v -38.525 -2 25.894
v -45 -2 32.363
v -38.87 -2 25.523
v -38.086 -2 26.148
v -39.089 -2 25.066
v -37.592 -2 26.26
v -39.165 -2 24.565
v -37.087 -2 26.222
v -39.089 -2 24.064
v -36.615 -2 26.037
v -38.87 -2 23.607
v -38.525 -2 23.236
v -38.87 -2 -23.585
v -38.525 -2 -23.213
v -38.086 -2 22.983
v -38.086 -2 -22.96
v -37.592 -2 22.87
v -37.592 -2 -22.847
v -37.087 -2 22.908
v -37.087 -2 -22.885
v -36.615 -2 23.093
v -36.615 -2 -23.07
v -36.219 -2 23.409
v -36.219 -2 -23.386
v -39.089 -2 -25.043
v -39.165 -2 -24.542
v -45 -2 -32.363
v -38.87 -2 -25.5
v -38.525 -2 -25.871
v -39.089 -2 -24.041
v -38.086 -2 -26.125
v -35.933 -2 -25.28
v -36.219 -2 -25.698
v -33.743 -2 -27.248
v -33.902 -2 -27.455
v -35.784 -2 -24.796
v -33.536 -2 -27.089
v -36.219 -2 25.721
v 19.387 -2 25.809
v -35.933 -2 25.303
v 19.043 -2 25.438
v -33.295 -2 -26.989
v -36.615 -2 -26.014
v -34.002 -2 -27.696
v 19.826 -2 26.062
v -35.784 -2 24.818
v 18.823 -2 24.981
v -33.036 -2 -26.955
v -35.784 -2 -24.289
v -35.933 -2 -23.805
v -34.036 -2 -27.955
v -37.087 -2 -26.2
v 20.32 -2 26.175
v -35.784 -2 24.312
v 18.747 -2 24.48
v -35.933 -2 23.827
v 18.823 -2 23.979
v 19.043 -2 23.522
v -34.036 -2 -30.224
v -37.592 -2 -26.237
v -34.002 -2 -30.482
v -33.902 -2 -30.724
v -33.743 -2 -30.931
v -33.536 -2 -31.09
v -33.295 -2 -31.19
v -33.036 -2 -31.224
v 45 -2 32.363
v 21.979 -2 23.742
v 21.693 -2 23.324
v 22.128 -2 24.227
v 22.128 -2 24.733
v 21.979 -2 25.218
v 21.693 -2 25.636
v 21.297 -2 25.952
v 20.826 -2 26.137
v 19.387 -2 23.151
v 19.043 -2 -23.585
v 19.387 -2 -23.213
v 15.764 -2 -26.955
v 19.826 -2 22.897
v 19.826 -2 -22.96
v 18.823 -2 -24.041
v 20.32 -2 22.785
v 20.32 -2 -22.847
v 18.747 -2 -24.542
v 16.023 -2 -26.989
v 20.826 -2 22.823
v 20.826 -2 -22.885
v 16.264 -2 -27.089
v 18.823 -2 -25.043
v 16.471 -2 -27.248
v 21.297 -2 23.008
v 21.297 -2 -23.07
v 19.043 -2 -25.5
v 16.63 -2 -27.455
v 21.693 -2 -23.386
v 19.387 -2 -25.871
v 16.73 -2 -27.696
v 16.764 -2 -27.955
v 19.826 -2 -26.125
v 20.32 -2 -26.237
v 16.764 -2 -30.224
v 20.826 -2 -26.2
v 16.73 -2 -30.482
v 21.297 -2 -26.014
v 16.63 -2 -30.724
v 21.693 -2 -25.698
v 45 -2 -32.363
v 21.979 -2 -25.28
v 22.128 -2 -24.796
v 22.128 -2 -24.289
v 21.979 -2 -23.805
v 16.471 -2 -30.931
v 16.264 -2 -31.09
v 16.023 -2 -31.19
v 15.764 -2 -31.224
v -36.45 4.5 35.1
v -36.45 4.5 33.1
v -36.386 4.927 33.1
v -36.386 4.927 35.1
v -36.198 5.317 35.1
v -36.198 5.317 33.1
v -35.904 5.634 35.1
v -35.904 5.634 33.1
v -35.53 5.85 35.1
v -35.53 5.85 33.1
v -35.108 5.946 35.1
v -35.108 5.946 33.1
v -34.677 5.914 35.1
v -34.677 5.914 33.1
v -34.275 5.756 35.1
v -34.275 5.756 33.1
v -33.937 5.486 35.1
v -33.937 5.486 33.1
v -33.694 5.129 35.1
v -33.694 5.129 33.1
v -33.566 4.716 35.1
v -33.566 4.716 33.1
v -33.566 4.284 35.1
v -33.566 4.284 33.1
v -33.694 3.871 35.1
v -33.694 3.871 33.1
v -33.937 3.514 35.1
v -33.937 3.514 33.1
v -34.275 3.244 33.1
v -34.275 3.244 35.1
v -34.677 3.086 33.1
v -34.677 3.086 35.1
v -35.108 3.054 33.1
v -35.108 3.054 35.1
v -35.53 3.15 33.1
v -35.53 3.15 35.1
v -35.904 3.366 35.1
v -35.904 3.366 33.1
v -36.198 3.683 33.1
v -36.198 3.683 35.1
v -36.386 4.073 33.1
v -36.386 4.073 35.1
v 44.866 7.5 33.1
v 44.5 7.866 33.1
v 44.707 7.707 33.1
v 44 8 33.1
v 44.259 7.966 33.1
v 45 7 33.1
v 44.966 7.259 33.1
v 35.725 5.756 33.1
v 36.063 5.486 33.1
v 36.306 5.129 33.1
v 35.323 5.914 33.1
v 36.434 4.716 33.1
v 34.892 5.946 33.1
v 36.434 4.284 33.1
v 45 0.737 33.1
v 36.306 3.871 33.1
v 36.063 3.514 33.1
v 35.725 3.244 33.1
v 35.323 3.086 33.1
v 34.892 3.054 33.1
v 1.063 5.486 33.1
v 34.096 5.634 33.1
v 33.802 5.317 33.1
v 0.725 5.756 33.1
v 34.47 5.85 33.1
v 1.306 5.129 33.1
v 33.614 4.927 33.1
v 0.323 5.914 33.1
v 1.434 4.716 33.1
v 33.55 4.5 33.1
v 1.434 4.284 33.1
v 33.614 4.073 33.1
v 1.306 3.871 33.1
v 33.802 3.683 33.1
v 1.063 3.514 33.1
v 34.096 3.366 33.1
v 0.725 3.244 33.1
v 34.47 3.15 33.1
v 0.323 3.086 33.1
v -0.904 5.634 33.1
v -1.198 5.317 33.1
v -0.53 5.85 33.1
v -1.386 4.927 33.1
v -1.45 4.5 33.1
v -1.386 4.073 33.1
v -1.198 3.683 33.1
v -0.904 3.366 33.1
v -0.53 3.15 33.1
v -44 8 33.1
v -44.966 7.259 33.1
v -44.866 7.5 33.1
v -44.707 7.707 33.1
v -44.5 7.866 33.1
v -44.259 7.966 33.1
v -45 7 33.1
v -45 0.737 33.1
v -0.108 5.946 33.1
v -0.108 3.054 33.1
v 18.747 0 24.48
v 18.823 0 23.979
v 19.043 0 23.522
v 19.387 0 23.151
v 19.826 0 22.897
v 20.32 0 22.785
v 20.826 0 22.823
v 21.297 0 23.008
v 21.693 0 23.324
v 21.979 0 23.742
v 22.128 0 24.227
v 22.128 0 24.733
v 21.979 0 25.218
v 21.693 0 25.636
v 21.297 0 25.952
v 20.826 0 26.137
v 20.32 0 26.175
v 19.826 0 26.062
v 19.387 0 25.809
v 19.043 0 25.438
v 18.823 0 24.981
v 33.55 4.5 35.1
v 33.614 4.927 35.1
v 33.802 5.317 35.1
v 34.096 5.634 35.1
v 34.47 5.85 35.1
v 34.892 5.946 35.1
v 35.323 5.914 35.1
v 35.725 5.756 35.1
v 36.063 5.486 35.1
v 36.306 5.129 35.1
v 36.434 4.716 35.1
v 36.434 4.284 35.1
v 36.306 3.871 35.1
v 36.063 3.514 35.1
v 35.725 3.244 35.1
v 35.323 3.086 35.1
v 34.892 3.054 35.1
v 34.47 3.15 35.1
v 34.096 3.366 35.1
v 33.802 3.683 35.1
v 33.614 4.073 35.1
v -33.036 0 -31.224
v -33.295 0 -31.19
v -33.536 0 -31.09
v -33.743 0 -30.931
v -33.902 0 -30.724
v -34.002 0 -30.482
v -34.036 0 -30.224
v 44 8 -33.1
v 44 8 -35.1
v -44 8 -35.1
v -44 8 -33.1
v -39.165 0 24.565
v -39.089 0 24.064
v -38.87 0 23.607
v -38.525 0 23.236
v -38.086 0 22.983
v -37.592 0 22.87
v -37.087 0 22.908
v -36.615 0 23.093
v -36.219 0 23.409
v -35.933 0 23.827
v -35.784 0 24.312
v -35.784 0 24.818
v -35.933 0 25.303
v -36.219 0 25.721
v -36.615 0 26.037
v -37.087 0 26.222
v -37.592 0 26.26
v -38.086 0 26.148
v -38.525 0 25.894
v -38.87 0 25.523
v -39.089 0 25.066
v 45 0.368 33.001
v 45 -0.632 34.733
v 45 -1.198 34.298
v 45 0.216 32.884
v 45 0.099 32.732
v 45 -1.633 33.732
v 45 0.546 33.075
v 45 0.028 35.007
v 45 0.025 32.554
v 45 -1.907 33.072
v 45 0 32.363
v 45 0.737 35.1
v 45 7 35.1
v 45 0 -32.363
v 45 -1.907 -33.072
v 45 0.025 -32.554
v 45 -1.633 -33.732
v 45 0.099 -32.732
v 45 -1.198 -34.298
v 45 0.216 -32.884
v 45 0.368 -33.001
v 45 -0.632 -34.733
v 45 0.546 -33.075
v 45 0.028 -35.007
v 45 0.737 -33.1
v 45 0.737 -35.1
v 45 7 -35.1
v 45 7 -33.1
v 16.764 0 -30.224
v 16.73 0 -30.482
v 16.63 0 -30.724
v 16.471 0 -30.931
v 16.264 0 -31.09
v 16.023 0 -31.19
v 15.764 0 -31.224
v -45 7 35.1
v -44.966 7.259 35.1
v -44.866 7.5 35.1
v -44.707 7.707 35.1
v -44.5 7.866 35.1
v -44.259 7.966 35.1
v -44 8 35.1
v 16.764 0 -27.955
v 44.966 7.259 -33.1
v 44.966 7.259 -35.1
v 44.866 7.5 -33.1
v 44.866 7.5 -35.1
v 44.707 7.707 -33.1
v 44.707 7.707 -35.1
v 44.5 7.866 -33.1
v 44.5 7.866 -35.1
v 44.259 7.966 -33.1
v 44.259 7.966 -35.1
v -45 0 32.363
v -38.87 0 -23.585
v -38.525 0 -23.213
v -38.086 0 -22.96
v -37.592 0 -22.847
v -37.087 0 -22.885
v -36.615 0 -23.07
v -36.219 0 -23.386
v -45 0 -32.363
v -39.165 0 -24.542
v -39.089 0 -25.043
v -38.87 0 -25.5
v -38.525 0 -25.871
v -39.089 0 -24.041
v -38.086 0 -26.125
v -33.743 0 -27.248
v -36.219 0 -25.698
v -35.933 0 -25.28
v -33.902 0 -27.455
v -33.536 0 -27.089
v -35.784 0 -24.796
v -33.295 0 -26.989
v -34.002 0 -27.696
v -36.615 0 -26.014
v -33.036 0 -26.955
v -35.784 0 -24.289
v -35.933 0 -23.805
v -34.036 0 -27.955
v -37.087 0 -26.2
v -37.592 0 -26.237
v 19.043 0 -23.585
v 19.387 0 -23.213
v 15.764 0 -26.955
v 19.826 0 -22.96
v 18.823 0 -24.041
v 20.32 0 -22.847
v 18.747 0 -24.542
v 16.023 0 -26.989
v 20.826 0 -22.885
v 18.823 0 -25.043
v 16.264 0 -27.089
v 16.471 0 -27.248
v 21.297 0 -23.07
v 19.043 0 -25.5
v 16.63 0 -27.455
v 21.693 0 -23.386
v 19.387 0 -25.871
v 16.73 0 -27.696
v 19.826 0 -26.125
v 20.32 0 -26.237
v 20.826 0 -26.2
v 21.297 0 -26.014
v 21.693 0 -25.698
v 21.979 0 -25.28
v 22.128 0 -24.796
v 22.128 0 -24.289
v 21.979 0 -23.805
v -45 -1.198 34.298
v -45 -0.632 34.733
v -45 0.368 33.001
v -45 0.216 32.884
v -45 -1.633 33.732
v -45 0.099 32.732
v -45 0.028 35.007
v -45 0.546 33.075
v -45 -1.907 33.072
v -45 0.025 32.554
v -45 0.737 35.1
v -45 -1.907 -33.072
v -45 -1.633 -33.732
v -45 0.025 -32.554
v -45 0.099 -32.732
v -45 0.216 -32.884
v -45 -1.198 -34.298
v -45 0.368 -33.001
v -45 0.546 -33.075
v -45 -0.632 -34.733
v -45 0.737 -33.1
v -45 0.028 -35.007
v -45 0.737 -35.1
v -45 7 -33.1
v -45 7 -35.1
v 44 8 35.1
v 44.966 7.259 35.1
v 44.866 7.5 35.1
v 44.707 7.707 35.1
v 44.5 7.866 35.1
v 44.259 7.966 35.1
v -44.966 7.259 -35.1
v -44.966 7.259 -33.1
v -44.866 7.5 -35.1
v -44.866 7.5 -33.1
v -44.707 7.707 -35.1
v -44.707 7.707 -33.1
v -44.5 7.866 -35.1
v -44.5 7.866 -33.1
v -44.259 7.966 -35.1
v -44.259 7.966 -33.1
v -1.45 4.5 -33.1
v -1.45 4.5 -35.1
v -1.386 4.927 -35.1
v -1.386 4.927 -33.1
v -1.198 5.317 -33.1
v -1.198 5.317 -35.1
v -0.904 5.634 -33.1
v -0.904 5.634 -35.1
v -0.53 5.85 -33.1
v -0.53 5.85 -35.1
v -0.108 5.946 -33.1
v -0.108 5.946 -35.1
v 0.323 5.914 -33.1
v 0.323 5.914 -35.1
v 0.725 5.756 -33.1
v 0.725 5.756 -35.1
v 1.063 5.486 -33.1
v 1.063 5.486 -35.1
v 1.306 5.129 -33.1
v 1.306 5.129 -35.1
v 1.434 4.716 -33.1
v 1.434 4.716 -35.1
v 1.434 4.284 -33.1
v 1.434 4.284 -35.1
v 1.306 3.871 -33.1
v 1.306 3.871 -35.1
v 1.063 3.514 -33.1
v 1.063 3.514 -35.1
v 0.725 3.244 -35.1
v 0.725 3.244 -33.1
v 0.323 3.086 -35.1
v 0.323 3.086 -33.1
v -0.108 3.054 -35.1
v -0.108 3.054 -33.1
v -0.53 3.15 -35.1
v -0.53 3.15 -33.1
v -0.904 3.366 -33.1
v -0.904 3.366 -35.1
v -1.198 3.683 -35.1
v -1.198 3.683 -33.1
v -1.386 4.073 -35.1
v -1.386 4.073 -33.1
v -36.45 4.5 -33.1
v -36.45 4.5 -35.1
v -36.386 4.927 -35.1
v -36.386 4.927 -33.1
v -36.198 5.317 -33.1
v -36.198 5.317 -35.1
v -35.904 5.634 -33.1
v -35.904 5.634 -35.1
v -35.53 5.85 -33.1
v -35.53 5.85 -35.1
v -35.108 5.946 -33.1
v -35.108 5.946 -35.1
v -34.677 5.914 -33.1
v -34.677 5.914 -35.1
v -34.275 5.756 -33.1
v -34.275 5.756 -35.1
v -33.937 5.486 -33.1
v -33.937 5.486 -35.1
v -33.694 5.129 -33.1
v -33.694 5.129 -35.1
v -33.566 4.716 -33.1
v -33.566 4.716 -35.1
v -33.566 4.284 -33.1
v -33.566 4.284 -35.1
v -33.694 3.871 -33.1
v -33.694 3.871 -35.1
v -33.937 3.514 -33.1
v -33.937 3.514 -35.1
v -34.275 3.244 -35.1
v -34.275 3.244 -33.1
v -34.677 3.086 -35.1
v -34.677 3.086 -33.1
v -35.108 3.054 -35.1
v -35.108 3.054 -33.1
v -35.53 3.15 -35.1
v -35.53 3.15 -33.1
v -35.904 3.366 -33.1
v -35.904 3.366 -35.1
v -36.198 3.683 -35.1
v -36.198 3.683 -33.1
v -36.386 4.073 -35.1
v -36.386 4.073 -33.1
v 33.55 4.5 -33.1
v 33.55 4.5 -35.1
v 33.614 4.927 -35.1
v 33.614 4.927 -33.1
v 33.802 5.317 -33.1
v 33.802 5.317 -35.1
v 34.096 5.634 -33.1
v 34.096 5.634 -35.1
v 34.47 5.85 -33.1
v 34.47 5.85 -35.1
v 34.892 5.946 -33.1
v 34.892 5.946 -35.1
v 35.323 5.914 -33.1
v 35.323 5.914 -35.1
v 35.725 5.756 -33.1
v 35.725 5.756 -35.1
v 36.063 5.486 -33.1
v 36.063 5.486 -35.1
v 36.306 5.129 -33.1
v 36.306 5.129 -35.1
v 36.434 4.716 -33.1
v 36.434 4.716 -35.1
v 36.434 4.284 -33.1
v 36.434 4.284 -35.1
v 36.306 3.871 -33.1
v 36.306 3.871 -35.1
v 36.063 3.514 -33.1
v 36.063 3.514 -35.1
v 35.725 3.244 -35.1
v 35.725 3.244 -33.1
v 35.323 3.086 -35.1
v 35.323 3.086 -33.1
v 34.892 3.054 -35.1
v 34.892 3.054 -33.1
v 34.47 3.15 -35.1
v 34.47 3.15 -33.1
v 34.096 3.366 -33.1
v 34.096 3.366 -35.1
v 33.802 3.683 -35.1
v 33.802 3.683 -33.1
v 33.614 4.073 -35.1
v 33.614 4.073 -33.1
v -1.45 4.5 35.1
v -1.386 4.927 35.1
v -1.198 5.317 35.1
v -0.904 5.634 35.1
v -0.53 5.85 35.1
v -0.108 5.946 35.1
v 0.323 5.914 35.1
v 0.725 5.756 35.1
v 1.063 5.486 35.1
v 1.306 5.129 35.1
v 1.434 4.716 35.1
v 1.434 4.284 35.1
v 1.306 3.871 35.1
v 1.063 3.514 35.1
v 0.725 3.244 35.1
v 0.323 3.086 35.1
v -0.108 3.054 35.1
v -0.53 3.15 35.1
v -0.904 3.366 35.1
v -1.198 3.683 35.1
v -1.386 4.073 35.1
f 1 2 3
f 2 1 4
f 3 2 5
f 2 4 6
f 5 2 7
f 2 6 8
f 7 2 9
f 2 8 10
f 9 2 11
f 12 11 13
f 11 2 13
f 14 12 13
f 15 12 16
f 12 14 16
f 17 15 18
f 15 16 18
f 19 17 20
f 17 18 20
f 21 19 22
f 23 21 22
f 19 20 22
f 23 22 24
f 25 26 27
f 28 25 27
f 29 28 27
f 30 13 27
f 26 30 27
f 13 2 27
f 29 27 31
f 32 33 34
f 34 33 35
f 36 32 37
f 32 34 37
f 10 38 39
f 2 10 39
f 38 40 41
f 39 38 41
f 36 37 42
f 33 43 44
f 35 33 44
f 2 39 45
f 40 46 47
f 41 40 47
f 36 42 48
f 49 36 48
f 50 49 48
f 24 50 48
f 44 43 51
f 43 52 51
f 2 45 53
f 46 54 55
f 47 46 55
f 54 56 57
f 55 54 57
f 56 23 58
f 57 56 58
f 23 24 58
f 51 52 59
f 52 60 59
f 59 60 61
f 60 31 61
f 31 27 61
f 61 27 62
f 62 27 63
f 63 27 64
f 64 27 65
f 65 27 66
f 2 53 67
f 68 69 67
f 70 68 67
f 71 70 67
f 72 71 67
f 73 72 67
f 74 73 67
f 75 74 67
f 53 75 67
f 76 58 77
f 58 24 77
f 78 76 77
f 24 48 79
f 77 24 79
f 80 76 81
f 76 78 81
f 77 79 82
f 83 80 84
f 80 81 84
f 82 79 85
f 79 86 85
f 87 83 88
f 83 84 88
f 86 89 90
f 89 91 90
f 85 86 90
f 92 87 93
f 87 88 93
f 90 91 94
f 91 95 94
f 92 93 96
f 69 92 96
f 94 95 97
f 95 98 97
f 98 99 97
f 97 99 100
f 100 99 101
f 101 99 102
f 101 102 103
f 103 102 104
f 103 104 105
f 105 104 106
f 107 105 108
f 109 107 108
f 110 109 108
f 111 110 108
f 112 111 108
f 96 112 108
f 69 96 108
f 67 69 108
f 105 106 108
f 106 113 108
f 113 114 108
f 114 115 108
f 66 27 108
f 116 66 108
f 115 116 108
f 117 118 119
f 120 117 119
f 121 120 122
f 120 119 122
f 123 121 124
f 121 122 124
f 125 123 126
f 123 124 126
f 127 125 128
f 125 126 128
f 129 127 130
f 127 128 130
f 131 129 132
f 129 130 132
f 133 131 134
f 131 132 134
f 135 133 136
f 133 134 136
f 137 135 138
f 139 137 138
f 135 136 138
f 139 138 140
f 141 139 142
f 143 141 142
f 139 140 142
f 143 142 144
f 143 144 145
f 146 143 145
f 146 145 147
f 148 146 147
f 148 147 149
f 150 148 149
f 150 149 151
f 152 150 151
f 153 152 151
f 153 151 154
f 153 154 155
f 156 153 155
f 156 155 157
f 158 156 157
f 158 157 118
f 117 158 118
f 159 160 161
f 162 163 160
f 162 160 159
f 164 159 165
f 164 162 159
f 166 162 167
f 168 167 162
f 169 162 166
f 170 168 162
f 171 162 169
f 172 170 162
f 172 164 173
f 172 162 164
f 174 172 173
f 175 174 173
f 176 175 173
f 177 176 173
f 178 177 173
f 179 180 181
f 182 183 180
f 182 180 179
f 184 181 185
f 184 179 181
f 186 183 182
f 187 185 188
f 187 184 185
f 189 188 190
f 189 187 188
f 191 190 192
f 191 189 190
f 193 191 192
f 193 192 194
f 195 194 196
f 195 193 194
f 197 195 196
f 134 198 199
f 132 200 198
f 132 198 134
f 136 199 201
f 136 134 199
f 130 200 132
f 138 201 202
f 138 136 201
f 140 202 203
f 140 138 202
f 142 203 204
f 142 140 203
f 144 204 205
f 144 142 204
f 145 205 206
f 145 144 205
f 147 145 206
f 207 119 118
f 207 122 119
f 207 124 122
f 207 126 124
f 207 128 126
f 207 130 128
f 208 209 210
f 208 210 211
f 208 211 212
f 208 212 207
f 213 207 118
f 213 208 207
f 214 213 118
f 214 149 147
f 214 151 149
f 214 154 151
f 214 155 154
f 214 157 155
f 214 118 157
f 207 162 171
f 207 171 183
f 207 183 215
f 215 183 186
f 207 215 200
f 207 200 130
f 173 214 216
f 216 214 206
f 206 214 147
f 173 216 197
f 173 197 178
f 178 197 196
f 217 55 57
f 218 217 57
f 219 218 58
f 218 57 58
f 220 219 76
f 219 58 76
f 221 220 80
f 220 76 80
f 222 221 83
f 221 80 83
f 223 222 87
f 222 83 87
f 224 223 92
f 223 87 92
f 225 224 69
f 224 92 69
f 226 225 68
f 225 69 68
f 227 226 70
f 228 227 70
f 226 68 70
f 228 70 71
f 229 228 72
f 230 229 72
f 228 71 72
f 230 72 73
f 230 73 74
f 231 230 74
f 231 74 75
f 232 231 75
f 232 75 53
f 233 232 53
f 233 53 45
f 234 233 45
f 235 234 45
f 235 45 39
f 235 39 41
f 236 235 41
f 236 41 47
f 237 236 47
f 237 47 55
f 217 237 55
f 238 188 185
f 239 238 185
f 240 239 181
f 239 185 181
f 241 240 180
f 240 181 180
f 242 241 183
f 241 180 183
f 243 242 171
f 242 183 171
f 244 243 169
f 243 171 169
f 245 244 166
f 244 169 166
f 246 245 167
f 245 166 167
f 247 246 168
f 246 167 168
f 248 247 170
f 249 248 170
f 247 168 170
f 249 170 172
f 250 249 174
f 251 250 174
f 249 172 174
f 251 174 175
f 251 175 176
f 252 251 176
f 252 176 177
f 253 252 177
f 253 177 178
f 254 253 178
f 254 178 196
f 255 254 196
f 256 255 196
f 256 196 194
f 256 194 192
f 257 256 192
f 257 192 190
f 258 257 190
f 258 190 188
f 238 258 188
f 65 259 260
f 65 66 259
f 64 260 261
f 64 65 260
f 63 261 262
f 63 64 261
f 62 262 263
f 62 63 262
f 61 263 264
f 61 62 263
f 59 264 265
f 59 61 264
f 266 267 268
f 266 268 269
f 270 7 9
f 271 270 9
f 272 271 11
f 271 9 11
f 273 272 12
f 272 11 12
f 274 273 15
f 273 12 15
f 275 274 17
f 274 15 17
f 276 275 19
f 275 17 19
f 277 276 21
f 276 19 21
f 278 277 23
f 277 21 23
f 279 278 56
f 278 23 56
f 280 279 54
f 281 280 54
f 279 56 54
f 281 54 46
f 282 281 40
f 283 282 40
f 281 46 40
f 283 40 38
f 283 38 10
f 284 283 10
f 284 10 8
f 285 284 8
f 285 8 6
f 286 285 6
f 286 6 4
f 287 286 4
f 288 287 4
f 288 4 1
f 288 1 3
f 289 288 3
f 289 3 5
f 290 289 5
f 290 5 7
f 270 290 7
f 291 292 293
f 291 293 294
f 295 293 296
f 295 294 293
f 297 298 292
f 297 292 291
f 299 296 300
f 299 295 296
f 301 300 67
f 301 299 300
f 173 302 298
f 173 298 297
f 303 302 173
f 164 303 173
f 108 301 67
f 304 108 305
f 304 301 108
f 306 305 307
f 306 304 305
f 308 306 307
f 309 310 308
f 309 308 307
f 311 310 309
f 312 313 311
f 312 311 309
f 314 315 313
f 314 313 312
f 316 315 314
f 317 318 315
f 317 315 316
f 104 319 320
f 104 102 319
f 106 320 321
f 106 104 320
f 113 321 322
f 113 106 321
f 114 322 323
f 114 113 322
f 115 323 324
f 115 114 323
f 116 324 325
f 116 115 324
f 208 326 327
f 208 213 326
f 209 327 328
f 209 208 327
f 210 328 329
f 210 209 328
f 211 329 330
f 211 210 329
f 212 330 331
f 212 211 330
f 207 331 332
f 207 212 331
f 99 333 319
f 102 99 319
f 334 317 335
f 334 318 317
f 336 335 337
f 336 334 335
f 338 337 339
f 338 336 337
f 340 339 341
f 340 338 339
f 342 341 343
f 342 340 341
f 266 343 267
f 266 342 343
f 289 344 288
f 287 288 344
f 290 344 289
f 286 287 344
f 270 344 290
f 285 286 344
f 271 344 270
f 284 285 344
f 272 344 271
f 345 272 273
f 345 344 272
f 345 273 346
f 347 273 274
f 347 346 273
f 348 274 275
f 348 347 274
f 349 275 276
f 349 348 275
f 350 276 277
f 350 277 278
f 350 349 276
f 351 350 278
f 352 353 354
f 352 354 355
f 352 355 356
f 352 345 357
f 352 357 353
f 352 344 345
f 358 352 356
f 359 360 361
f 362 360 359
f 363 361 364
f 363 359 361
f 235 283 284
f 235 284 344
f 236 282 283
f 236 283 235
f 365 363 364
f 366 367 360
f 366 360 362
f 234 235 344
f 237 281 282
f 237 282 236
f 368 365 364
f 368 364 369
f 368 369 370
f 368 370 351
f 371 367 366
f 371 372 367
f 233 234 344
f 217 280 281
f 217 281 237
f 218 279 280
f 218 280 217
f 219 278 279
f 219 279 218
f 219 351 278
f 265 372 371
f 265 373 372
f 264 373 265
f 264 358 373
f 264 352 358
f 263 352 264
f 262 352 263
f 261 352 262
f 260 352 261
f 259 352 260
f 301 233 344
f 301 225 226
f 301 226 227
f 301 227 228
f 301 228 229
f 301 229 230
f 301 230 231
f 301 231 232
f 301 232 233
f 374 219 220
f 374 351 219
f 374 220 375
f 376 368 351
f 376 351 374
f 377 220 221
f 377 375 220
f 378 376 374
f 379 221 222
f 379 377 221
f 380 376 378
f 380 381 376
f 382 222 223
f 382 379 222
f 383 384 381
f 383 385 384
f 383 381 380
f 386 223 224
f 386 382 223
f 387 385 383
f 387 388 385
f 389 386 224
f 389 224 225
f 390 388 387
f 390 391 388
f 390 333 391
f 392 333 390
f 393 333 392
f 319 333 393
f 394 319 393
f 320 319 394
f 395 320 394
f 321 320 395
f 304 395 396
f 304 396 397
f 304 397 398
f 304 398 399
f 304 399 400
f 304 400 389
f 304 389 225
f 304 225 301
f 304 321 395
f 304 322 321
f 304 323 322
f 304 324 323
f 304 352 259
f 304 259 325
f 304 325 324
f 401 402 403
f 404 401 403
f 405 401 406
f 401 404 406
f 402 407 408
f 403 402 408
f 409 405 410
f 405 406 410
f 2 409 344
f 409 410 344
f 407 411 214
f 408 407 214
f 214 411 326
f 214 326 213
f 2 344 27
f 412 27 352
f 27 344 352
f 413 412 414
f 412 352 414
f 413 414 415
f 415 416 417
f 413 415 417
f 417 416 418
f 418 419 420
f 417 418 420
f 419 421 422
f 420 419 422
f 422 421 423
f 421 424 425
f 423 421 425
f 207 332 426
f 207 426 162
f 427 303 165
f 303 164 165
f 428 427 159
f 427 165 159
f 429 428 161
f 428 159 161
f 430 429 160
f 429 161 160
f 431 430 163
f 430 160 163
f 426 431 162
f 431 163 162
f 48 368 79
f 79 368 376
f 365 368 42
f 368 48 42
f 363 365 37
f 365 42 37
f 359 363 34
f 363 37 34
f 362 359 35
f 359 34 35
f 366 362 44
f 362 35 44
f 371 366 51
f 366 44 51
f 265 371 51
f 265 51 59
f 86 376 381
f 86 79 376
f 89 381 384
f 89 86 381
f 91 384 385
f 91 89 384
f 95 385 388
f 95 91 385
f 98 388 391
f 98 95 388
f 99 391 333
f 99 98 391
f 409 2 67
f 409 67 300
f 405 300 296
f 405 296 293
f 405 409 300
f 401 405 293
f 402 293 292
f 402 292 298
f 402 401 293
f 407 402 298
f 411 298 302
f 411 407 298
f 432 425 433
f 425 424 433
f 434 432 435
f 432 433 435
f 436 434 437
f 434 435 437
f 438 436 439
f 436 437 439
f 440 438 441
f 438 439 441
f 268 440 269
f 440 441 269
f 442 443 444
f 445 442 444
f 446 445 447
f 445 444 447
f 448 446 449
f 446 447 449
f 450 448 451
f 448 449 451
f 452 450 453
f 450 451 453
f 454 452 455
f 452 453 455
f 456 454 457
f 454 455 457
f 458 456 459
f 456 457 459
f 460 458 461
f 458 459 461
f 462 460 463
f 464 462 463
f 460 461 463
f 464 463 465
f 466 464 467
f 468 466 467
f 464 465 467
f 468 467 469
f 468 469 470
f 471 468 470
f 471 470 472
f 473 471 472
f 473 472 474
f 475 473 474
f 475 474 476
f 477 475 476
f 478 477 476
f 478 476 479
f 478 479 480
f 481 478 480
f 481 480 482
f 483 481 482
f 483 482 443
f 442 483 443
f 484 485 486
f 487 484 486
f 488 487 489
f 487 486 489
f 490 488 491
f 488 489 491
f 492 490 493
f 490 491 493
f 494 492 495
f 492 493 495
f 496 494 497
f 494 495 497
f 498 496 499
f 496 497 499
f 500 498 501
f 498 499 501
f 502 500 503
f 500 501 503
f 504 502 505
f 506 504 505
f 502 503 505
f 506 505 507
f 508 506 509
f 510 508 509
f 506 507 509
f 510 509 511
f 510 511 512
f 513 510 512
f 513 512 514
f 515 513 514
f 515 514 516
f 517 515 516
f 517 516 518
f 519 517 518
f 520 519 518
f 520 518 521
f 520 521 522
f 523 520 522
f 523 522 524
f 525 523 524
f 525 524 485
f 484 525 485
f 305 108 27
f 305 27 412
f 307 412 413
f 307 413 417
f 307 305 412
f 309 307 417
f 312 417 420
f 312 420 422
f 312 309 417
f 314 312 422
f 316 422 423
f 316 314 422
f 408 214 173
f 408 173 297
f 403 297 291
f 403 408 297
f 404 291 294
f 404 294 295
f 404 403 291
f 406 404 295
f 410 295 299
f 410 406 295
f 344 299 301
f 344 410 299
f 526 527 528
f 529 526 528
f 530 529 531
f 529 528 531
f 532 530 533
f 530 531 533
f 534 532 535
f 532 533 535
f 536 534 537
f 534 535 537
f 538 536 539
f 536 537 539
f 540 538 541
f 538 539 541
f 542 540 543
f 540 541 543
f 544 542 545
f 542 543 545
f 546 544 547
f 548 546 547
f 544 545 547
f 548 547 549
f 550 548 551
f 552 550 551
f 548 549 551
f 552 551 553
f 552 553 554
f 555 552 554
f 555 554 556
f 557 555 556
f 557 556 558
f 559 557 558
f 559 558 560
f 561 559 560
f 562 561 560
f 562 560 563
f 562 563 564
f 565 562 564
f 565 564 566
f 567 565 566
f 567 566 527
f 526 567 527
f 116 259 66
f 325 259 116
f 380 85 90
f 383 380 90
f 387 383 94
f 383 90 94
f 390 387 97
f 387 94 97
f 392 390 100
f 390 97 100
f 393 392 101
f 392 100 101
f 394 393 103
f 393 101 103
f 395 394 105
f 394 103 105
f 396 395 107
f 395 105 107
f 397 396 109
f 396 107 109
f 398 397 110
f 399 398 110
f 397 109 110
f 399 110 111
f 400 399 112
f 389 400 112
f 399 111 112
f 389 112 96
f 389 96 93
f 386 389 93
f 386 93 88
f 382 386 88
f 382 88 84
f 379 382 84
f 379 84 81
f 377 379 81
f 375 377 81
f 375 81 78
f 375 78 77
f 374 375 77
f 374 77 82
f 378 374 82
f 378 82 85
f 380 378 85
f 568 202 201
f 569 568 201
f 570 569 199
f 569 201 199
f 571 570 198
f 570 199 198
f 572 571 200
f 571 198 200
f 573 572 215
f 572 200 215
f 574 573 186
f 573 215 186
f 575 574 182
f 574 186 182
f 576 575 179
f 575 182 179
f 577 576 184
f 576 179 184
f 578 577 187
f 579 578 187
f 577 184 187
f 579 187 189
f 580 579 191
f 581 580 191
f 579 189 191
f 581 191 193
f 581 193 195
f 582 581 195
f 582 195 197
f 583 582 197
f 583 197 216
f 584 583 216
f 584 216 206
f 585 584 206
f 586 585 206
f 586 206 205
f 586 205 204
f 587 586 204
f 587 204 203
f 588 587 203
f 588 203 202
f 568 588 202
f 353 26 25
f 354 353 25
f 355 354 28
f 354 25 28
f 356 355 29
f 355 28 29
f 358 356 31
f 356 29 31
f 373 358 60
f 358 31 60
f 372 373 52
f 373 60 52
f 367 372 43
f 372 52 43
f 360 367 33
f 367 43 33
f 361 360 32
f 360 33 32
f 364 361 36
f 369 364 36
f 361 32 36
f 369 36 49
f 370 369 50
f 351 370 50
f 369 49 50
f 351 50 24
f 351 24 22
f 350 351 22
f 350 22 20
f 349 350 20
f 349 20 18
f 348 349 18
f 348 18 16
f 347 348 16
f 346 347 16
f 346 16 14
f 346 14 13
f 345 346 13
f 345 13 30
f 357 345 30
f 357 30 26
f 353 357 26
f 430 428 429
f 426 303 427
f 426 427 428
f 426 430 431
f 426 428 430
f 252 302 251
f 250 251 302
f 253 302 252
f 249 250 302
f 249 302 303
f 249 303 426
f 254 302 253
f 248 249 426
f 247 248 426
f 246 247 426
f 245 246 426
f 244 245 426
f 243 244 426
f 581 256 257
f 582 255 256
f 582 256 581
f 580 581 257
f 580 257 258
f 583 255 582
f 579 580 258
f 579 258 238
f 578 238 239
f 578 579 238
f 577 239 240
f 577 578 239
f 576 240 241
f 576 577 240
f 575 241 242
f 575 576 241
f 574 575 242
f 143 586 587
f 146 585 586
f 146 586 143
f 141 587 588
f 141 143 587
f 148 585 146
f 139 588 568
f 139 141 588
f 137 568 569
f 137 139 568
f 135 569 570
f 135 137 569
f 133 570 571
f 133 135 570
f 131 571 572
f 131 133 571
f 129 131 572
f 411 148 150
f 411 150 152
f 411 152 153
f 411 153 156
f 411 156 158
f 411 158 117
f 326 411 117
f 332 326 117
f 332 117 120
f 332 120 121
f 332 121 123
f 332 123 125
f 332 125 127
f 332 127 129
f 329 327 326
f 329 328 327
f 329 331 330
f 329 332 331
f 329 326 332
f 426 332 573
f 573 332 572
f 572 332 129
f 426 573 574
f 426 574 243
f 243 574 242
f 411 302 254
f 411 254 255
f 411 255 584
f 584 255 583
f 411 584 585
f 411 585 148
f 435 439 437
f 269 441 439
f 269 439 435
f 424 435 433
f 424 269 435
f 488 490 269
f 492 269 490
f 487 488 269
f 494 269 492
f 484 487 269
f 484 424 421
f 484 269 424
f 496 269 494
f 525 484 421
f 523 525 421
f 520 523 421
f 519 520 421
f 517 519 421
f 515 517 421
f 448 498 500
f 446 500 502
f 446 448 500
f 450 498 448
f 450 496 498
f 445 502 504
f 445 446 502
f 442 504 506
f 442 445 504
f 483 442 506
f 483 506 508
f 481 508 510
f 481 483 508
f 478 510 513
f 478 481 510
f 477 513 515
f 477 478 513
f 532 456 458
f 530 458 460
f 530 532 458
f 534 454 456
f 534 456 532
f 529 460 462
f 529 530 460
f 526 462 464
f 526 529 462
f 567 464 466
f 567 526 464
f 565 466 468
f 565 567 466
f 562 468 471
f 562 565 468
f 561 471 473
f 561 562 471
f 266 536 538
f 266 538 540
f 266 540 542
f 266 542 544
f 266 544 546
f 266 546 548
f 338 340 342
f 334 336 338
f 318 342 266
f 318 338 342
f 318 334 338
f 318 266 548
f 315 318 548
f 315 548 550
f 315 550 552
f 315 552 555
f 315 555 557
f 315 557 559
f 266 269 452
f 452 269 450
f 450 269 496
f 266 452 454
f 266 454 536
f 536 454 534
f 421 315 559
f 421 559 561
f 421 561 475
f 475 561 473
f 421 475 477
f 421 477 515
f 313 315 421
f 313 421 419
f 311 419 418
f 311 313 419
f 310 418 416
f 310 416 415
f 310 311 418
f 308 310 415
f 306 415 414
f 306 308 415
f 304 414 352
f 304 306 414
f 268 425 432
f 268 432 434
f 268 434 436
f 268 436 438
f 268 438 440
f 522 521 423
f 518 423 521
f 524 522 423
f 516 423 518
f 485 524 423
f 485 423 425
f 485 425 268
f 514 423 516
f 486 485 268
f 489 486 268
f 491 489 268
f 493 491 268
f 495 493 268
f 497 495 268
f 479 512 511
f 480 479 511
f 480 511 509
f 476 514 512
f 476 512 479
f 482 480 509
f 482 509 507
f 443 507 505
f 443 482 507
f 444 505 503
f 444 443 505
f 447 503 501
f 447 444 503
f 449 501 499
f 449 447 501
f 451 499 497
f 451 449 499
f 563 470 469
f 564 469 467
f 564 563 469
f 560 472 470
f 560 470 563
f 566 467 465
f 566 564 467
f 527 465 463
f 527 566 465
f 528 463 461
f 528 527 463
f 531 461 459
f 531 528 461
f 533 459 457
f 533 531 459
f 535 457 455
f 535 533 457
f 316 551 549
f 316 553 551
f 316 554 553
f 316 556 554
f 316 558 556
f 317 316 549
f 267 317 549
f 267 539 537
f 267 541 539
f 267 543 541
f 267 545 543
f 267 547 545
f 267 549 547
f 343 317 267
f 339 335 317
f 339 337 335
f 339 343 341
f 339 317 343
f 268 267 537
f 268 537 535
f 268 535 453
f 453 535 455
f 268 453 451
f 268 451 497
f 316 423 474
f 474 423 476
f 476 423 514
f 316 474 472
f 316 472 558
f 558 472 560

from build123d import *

# Parameters (mm, degrees)
SKETCH_1_W                         = 90
SKETCH_1_H                         = 70.2
SM_BASE_FLANGE_1_DEPTH             = 2
SM_EDGE_FLANGE_1_STRIP_W           = 9.4732
SM_EDGE_FLANGE_1_STRIP_H           = 2
SM_EDGE_FLANGE_1_STRIP_CUT_DEPTH   = 90
SM_EDGE_FLANGE_1_STRIP_2_W         = 9.4732
SM_EDGE_FLANGE_1_STRIP_2_H         = 2
SM_EDGE_FLANGE_1_STRIP_CUT_2_DEPTH = 90
SM_EDGE_FLANGE_1_DEPTH             = 90
SM_EDGE_FLANGE_1_BEND_DEPTH        = 90
SKETCH_12_W                        = 50.800050643
SKETCH_12_H                        = 4.268431417
CUT_EXTRUDE_1_DEPTH                = 10
FILLET_1_R                         = 1
FILLET_2_R                         = 1
HOLE_WIZARD_M2_5_2_D               = 2.9
HOLE_WIZARD_M3_1_D                 = 3.4


# Sheet-metal steps are written as plain solids
with BuildPart() as part:
    # Sketch 1 → 基体-法兰1 (new body)
    with BuildSketch(Plane(origin=(0, 0, 0), x_dir=(1, 0, 0), z_dir=(0, 1, 0))):
        Rectangle(SKETCH_1_W, SKETCH_1_H)
    extrude(amount=-SM_BASE_FLANGE_1_DEPTH)

    # 边线-法兰1 strip (across the edge) → 边线-法兰1 strip cut (cut)
    with BuildSketch(Plane(origin=(-45, 0, 35.1), x_dir=(0, 0, -1), z_dir=(1, 0, 0))):
        with Locations((-2, -1)):
            Rectangle(SM_EDGE_FLANGE_1_STRIP_W, SM_EDGE_FLANGE_1_STRIP_H)
    extrude(amount=SM_EDGE_FLANGE_1_STRIP_CUT_DEPTH, mode=Mode.SUBTRACT)

    # 边线-法兰1 strip 2 (across the edge) → 边线-法兰1 strip cut 2 (cut)
    with BuildSketch(Plane(origin=(45, 0, -35.1), x_dir=(0, 0, 1), z_dir=(-1, 0, 0))):
        with Locations((-2, -1)):
            Rectangle(SM_EDGE_FLANGE_1_STRIP_2_W, SM_EDGE_FLANGE_1_STRIP_2_H)
    extrude(amount=SM_EDGE_FLANGE_1_STRIP_CUT_2_DEPTH, mode=Mode.SUBTRACT)

    # 边线-法兰1 section (across the edge) → 边线-法兰1 (add)
    with BuildSketch(Plane(origin=(-45, 0, 35.1), x_dir=(0, 0, -1), z_dir=(1, 0, 0))):
        with BuildLine():
            Line((0, 0.7366), (0, 8))
            Line((0, 8), (2, 8))
            Line((2, 8), (2, 0.7366))
            ThreePointArc((2, 0.7366), (2.215745145, 0.215745145), (2.7366, 0))
            Line((2.7366, 0), (2.7366, -2))
            ThreePointArc((2.7366, -2), (0.801531583, -1.198468417), (0, 0.7366))
        make_face()
    extrude(amount=SM_EDGE_FLANGE_1_DEPTH)

    # 边线-法兰1 section 2 (across the edge) → 边线-法兰1 bend (add)
    with BuildSketch(Plane(origin=(45, 0, -35.1), x_dir=(0, 0, 1), z_dir=(-1, 0, 0))):
        with BuildLine():
            Line((0, 0.7366), (0, 8))
            Line((0, 8), (2, 8))
            Line((2, 8), (2, 0.7366))
            ThreePointArc((2, 0.7366), (2.215745145, 0.215745145), (2.7366, 0))
            Line((2.7366, 0), (2.7366, -2))
            ThreePointArc((2.7366, -2), (0.801531583, -1.198468417), (0, 0.7366))
        make_face()
    extrude(amount=SM_EDGE_FLANGE_1_BEND_DEPTH)

    # 草图12 → 切除-拉伸1 (cut)
    with BuildSketch(Plane(origin=(0, 0, 0), x_dir=(1, 0, 0), z_dir=(0, 1, 0))):
        with Locations((-8.635838808, 29.089367058)):
            Rectangle(SKETCH_12_W, SKETCH_12_H)
    extrude(amount=-CUT_EXTRUDE_1_DEPTH, mode=Mode.SUBTRACT)

    # 圆角1
    fillet_1_edges = [part.edges().sort_by_distance(p)[0] for p in [
        (-34.035864129, -1, -26.955151349),
        (-34.035864129, -1, -31.223582766),
        (16.764186514, -1, -31.223582766),
        (16.764186514, -1, -26.955151349),
    ]]
    fillet(fillet_1_edges, radius=FILLET_1_R)

    # 圆角2
    fillet_2_edges = [part.edges().sort_by_distance(p)[0] for p in [
        (-45, 8, 34.1),
        (45, 8, 34.1),
        (45, 8, -34.1),
        (-45, 8, -34.1),
    ]]
    fillet(fillet_2_edges, radius=FILLET_2_R)

    # M2.5 间隙孔2 (through all)
    with Locations(Plane.XY.offset(35.1)):
        with Locations((0, 4.5), (35, 4.5), (-35, 4.5)):
            Hole(HOLE_WIZARD_M2_5_2_D / 2)

    # M3 间隙孔1 (through all)
    with Locations(Plane(origin=(0, 0, 0), x_dir=(1, 0, 0), z_dir=(0, 1, 0))):
        with Locations((-37.464896876, -24.56505715), (-37.464896876, 24.542151638), (20.447218948, 24.542151638), (20.447218948, -24.479946406)):
            Hole(HOLE_WIZARD_M3_1_D / 2)


solid = part.part
